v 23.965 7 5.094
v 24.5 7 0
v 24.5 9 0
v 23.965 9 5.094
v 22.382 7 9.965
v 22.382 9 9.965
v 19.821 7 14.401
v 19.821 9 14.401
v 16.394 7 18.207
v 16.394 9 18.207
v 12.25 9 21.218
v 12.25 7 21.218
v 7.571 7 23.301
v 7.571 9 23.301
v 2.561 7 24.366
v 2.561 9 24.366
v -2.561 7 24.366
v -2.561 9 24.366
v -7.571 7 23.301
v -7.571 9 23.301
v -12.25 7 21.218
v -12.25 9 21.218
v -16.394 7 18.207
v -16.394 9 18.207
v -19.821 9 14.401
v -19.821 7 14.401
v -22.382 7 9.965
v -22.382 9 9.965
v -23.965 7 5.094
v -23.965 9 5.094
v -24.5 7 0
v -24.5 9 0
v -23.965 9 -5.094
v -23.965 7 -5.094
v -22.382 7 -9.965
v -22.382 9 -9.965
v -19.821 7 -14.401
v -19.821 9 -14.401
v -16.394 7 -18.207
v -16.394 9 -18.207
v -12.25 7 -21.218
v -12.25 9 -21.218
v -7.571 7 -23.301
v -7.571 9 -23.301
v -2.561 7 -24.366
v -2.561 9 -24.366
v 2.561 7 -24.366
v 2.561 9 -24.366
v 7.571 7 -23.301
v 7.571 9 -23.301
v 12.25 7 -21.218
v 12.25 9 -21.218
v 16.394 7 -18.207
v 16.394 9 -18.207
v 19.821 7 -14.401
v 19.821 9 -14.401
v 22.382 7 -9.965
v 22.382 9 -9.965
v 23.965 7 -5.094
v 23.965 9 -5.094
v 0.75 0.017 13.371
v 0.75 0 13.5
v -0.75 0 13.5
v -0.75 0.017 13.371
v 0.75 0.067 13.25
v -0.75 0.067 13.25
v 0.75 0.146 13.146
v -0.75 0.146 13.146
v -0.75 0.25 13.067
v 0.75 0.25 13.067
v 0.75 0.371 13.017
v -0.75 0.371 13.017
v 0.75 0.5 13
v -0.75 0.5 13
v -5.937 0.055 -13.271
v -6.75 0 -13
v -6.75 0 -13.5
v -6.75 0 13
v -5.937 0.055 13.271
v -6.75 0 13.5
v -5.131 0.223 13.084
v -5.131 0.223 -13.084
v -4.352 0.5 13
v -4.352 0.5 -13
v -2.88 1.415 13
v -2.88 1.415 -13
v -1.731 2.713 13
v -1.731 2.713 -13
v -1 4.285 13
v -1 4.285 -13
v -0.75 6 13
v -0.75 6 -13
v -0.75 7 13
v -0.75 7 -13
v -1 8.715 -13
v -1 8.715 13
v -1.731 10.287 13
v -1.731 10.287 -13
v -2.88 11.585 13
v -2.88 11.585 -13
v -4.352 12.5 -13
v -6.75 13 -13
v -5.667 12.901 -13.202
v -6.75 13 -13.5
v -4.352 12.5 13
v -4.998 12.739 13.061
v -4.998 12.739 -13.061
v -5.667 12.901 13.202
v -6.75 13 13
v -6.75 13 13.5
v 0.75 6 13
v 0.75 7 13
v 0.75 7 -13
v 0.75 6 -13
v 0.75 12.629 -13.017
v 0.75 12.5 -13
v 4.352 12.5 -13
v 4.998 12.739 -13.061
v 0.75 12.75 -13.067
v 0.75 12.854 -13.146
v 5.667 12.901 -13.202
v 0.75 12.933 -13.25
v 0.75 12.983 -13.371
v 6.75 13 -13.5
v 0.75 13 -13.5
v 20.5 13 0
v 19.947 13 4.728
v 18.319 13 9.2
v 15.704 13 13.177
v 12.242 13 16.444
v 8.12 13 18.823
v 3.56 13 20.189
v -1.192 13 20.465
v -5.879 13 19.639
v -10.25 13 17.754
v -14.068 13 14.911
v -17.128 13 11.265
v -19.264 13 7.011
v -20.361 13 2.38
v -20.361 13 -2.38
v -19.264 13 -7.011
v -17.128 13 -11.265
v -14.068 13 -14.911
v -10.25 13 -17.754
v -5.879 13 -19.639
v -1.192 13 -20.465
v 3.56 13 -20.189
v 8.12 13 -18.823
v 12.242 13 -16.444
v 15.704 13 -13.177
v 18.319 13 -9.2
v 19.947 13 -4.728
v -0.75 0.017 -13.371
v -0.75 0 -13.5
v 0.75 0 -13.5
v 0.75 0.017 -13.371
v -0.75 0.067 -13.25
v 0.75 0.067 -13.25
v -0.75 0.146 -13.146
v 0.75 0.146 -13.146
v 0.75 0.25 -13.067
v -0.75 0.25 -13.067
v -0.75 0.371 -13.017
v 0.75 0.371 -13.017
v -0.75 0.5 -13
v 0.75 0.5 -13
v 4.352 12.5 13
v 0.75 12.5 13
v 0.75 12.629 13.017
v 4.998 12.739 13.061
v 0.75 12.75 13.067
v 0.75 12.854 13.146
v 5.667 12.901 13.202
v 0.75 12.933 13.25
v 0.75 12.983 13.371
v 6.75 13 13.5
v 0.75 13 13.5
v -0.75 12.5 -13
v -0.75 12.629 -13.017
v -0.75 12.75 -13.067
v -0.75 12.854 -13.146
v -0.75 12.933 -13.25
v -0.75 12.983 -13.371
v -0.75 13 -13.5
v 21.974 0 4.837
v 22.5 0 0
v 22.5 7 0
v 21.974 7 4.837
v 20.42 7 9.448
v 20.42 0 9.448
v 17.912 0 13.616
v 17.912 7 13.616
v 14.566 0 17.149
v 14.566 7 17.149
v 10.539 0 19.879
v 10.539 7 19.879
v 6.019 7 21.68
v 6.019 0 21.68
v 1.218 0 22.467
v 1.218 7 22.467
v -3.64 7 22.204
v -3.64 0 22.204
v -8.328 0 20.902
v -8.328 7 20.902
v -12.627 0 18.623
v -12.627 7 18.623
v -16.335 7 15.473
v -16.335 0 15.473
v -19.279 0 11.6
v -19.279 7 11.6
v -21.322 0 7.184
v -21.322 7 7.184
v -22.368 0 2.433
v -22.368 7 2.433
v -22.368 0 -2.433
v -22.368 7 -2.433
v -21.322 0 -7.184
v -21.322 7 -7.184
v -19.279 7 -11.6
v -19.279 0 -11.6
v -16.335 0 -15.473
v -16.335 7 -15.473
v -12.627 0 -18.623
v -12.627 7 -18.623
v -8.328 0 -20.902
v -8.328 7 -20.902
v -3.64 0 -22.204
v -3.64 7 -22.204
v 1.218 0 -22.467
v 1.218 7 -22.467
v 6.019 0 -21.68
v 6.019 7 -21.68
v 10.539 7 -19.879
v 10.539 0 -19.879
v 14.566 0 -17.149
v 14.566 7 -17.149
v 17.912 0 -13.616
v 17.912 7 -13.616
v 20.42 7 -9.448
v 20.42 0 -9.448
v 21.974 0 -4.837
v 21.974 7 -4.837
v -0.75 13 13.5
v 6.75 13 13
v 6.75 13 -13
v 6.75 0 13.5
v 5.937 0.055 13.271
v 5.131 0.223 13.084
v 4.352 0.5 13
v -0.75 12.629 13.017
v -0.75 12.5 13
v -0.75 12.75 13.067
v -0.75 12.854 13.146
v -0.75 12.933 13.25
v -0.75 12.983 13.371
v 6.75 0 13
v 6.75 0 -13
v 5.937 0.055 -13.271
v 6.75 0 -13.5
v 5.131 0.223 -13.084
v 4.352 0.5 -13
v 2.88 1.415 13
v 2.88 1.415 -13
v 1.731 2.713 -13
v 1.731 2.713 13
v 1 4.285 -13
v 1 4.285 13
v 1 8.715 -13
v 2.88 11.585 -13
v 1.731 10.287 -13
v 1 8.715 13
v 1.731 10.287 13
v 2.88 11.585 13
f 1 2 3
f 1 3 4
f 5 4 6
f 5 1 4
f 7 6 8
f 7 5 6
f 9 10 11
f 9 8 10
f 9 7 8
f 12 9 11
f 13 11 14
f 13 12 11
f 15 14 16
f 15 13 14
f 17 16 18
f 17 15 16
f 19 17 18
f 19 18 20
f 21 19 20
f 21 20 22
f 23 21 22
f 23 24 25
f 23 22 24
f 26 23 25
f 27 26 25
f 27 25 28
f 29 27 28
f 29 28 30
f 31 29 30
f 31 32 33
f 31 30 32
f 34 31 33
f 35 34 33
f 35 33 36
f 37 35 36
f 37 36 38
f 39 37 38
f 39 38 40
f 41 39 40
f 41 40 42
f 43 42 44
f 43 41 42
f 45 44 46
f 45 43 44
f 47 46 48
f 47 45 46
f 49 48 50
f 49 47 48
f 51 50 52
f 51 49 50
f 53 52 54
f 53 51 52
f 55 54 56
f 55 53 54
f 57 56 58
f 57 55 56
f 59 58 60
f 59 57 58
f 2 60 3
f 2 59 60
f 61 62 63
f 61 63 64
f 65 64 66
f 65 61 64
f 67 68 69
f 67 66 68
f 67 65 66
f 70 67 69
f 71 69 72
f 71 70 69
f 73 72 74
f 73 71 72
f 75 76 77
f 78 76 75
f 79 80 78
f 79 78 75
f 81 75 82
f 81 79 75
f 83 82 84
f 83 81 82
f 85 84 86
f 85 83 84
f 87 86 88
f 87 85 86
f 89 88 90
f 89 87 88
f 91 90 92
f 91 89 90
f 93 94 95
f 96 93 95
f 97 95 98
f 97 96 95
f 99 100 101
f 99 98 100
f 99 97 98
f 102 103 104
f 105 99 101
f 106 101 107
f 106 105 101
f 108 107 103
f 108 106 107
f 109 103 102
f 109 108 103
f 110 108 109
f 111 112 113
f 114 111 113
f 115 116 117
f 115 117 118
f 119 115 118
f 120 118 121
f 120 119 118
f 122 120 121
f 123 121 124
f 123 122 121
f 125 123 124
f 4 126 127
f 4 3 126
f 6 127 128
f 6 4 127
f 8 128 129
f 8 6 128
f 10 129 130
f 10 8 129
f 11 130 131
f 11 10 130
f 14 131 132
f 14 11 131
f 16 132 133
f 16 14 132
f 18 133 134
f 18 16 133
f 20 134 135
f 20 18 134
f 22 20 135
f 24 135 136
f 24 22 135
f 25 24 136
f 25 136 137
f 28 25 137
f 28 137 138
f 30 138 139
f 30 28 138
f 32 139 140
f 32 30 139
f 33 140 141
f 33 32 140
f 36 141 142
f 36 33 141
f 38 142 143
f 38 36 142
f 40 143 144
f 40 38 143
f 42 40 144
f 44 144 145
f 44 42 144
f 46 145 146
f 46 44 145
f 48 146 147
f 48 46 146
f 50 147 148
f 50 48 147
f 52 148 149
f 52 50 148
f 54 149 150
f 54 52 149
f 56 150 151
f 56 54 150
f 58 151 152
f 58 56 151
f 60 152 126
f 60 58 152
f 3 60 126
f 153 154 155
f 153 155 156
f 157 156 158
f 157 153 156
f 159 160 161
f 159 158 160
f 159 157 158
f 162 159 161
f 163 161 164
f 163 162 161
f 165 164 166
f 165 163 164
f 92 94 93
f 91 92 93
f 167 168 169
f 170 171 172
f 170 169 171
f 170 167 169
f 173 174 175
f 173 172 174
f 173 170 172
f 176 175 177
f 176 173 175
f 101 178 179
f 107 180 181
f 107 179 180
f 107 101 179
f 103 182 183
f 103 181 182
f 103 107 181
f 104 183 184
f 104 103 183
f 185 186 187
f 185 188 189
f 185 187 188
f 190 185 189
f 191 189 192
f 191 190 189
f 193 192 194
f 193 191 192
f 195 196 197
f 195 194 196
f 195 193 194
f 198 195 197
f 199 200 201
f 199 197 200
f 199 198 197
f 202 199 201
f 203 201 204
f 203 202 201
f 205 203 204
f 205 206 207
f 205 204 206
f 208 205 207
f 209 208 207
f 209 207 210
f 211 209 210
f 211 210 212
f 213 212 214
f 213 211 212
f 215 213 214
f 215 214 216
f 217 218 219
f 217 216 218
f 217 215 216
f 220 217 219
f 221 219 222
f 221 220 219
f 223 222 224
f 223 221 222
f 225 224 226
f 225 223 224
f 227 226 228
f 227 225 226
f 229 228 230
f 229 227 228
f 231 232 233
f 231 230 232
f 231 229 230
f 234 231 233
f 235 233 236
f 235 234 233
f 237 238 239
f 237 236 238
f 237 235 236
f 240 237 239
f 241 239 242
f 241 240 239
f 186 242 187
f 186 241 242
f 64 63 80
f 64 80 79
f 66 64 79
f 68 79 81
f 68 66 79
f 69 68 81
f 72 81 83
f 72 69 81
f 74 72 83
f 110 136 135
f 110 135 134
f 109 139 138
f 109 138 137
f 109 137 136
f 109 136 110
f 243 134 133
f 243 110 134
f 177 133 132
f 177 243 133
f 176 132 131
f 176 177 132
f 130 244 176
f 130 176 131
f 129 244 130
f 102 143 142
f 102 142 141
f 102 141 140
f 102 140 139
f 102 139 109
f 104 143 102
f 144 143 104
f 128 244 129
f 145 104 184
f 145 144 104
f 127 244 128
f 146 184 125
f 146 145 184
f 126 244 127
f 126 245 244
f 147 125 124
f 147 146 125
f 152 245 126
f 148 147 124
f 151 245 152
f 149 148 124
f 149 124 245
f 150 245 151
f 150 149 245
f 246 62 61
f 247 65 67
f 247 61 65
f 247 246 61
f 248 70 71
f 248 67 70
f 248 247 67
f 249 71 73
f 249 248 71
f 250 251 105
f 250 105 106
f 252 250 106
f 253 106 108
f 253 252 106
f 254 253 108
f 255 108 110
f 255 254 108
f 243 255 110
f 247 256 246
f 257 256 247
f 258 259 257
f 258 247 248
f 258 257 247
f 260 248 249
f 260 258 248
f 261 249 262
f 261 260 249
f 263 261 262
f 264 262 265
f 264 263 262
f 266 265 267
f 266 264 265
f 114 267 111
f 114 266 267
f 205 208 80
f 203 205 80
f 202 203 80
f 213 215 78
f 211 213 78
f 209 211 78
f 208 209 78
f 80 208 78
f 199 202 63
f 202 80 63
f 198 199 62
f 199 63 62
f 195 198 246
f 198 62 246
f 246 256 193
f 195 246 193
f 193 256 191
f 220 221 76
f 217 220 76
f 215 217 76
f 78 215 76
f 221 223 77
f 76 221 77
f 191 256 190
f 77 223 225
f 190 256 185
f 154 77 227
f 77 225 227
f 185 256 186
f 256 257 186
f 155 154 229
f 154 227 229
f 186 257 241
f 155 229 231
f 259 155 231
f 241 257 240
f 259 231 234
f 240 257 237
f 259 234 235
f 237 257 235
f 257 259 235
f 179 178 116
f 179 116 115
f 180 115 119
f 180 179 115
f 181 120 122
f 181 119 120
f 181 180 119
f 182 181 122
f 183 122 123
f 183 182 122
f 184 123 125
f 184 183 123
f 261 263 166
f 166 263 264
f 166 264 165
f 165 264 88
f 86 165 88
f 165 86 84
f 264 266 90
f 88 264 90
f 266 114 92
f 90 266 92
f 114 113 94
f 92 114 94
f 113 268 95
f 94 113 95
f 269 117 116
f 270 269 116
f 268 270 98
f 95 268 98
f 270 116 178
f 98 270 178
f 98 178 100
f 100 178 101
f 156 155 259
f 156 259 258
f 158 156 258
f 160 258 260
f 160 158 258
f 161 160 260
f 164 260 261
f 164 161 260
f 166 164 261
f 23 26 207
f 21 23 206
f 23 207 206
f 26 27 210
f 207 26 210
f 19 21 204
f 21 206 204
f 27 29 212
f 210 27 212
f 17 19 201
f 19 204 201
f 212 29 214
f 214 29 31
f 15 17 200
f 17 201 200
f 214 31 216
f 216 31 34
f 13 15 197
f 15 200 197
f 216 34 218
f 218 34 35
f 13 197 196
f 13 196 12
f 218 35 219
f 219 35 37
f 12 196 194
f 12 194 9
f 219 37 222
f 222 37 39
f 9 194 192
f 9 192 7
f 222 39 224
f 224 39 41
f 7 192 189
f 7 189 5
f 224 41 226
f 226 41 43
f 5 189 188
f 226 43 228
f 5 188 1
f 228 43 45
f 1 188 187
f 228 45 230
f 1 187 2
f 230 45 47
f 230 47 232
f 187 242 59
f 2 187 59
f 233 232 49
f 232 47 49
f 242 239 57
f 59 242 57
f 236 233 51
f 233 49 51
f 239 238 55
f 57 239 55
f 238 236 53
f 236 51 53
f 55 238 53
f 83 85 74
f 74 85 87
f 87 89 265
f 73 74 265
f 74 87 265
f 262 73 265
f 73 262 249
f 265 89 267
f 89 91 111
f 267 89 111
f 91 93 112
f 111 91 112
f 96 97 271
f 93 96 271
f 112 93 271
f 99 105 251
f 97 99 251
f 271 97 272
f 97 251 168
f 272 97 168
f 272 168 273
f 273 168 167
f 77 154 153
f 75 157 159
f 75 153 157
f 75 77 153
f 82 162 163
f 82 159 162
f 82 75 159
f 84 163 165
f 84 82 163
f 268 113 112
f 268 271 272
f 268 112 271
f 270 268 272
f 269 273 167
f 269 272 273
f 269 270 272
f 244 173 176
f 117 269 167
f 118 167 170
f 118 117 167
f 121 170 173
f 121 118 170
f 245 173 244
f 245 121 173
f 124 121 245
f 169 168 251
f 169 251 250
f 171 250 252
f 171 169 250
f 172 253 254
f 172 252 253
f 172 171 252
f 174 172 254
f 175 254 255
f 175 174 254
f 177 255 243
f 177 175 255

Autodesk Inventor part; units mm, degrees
ref_plane "YZ Plane" through (0, 0, 0) normal (1, 0, 0) x (0, 1, 0)
ref_plane "XZ Plane" through (0, 0, 0) normal (0, 1, 0) x (-1, 0, 0)
ref_plane "XY Plane" through (0, 0, 0) normal (0, 0, 1) x (1, 0, 0)
sketch "Sketch1" plane through (0, 0, 0) normal (0, 0, 1) x (1, 0, 0)
  line L0 (0, 0) -> (0, 13)
  line L1 (0, 13) -> (22.5, 13)
  line L2 (22.5, 13) -> (24.5, 13)
  line L3 (24.5, 13) -> (24.5, 7)
  line L4 (24.5, 7) -> (22.5, 7)
  line L5 (22.5, 7) -> (22.5, 0)
  line L6 (22.5, 0) -> (0, 0)
  dimension "d0" = 13
  dimension "d3" = 22.5
  dimension "d4" = 2
  dimension "d5" = 6
  dimension "d6" = 2
  dimension "d7" = 7
revolve "Revolution1" add sketch "Sketch1" angle 360 about axis through (0, 0, 0) along (0, 1, 0)
sketch "Sketch2" plane through (0, 13, 0) normal (0, 1, 0) x (1, 0, 0)
  line L0 (0.75, 13) -> (-0.75, 13)
  line L1 (-0.75, 13) -> (-0.75, -13)
  line L2 (-0.75, -13) -> (0.75, -13)
  line L3 (0.75, -13) -> (0.75, 13)
  point P0 (0, 0)
  dimension "d9" = 1.5
  dimension "d10" = 26
  dimension "d11" = 13
  dimension "d12" = 0.75
extrude "Extrusion1" cut sketch "Sketch2" against normal through all
fillet "Fillet1" radius 6 4 edges at (-0.75, 13, 0) (0.75, 13, 0) (-0.75, 0, 0) (0.75, 0, 0)
chamfer "Chamfer1" distance 4 angle 45 1 edges at (-24.5, 13, 0)
fillet "Fillet2" radius 0.5 4 edges at (0, 13, -13) (0, 13, 13) (0, 0, -13) (0, 0, 13)
equation "\"d11\" = 0.5 * d10"
equation "\"d12\" = 0.5 * d9"
properties part number "head_innter_top" material "Aluminum 6061"
